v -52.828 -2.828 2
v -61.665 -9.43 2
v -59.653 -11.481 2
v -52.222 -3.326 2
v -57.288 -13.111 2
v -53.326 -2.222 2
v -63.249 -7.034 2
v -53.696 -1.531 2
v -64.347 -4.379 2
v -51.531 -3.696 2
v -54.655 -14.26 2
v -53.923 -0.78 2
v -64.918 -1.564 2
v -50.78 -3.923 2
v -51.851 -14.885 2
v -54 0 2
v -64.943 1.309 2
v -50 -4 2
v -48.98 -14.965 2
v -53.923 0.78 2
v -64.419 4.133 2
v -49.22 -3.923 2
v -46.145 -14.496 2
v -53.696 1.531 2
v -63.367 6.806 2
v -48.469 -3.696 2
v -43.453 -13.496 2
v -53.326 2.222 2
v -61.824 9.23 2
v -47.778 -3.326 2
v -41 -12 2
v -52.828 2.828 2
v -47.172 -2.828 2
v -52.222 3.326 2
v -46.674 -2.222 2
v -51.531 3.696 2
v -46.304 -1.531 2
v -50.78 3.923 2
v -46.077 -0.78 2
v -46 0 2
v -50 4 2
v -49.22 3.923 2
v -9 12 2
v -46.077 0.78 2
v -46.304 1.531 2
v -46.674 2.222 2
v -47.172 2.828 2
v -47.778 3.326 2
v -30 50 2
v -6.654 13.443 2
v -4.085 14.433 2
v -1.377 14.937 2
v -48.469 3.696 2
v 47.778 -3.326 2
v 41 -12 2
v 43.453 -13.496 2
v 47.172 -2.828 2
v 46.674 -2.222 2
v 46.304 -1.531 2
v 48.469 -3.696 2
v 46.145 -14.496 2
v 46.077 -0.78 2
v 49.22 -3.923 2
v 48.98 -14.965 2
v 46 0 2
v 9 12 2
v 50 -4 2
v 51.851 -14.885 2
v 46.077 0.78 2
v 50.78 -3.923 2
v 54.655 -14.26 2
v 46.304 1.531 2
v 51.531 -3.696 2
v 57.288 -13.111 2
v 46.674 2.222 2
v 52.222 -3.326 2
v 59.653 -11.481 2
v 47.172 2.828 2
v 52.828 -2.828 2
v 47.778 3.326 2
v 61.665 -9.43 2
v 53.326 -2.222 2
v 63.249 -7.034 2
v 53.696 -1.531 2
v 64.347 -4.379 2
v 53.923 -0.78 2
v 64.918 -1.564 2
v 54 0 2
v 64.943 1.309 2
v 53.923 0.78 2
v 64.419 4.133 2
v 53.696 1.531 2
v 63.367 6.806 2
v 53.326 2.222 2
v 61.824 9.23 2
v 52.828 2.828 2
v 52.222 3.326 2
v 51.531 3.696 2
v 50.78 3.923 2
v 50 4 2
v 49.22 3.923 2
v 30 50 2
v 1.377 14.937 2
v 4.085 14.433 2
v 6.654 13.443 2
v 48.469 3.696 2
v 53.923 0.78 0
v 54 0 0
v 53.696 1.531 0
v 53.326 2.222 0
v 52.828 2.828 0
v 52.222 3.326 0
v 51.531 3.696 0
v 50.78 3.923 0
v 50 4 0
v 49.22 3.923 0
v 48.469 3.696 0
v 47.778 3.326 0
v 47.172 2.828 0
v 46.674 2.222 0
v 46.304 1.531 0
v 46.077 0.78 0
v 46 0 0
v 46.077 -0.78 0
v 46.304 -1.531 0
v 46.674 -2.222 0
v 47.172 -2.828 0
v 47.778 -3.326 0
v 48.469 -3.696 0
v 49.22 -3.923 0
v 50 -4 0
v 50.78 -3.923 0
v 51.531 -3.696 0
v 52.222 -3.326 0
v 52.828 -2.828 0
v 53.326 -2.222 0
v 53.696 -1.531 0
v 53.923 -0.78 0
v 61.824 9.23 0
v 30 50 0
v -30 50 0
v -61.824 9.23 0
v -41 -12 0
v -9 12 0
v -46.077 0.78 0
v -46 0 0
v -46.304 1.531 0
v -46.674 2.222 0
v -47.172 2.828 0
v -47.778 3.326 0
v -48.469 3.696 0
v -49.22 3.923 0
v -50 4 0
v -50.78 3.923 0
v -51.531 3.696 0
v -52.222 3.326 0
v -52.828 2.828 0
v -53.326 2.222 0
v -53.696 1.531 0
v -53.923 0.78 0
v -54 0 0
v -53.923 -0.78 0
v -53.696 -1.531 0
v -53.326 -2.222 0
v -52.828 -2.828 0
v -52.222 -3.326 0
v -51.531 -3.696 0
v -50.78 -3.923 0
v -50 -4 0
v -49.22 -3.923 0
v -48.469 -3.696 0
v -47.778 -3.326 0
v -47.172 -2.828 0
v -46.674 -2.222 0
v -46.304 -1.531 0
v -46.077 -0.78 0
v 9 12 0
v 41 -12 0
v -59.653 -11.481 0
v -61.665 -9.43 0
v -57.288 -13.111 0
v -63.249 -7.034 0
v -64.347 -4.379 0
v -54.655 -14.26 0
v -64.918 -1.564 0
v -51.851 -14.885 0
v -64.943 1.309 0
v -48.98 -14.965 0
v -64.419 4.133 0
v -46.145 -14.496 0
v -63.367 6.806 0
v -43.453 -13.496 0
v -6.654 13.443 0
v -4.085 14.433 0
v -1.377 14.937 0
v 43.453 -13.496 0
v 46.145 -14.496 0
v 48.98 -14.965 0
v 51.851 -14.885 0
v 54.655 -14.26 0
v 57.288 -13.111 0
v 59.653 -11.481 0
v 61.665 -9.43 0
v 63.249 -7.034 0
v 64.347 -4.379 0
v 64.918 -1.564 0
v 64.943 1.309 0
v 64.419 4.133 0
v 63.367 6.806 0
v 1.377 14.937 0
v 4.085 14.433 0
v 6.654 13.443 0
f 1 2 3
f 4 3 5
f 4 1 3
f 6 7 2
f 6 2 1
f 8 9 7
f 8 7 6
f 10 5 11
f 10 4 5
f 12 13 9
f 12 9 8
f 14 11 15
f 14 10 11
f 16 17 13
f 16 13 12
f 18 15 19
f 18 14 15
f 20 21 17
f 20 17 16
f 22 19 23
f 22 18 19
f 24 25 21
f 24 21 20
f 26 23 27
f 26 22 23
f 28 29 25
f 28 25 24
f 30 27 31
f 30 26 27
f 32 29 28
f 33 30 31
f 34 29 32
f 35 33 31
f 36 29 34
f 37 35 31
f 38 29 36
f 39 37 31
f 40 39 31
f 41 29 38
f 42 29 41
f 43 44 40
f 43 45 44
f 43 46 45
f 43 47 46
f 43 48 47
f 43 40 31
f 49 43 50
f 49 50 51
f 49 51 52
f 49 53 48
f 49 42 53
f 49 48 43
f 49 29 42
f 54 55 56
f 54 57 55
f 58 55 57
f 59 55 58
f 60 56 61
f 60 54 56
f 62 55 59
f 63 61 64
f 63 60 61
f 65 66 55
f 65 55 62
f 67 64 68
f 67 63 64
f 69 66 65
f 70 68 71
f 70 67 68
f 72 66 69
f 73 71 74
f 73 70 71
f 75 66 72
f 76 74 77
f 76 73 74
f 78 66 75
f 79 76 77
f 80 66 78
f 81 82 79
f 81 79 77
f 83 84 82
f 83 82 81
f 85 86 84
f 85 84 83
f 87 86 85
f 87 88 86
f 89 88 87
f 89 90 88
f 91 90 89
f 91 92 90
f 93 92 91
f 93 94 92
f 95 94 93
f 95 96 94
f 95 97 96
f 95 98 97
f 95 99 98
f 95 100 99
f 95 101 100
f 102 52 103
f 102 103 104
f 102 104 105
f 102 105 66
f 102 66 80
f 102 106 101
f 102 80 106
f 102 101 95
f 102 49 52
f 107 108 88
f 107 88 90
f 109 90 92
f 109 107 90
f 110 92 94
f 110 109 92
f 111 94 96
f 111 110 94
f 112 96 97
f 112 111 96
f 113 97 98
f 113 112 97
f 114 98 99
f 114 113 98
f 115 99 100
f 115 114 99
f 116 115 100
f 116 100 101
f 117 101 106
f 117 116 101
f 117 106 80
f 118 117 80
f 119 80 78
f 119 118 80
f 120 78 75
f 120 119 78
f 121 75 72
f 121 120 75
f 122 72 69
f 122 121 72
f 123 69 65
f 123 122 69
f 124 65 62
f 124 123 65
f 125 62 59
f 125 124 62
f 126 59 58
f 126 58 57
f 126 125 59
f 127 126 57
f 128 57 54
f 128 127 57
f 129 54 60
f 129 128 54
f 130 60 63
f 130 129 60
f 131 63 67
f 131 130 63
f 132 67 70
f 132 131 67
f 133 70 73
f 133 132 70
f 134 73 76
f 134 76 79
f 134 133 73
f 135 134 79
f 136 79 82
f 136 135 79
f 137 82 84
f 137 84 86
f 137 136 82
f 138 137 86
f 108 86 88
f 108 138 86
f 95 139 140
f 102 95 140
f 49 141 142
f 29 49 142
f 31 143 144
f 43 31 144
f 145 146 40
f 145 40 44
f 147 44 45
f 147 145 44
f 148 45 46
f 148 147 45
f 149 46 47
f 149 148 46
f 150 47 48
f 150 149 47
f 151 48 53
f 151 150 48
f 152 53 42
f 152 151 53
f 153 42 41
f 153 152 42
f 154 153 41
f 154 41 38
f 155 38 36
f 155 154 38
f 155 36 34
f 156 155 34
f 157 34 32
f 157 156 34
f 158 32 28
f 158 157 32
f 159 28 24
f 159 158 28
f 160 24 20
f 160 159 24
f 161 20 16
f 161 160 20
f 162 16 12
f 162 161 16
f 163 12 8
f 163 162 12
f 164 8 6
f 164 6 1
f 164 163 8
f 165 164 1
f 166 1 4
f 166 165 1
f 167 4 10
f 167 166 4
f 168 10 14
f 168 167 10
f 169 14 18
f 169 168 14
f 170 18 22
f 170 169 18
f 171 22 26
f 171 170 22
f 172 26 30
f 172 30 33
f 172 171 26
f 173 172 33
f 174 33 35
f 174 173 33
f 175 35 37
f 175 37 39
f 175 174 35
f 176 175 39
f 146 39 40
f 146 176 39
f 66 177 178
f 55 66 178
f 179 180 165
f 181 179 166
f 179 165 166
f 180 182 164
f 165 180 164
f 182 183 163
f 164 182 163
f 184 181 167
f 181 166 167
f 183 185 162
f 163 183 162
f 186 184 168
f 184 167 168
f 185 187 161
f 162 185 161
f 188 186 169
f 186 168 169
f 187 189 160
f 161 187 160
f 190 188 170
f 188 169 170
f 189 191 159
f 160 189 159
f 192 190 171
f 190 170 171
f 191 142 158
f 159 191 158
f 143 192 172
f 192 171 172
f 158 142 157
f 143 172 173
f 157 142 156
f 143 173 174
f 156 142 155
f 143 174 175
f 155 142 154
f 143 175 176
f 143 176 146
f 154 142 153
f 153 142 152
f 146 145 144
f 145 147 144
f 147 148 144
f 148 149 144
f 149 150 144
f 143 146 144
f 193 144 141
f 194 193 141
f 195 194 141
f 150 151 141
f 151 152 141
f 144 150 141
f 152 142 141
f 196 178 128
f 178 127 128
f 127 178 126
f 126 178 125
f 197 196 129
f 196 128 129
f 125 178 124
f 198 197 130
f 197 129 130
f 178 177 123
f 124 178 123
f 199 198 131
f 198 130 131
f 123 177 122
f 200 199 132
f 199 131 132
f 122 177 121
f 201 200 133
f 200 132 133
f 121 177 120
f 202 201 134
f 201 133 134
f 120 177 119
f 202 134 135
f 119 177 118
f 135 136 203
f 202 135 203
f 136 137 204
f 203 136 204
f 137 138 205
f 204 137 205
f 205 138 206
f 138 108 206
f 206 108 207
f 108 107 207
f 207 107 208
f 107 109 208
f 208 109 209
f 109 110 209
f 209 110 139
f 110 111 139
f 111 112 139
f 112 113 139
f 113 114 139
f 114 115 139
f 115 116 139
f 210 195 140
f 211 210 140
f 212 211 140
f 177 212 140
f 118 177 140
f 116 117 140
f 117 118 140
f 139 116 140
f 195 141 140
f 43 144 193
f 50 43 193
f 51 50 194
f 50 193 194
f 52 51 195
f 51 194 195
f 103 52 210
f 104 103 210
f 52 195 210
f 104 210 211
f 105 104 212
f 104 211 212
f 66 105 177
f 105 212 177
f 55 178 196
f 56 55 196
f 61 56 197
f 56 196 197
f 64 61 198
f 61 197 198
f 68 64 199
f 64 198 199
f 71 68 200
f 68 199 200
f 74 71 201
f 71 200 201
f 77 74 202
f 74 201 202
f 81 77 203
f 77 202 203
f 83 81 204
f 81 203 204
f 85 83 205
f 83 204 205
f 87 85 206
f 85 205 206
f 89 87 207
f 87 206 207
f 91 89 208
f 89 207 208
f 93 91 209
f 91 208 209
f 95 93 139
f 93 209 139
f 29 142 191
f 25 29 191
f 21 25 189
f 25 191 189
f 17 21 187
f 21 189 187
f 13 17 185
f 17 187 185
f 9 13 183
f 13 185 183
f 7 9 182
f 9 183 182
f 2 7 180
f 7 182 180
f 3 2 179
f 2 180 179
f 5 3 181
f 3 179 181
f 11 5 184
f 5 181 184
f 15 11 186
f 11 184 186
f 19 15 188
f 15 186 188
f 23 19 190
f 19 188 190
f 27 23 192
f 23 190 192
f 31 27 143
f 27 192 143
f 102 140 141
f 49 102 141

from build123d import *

# Parameters (mm, degrees)
F0_R     = 4
F1_DEPTH = 2


with BuildPart() as f1:
    # F0 (on Top) → F1 (new body)
    with BuildSketch(Plane.XY):
        with BuildLine():
            Line((-30, 50), (-61.824242, 9.229697))
            ThreePointArc((-61.824242, 9.229697), (-60.708366, -10.503852), (-41, -12))
            Line((-41, -12), (-9, 12))
            ThreePointArc((-9, 12), (0, 15), (9, 12))
            Line((9, 12), (41, -12))
            ThreePointArc((41, -12), (60.708366, -10.503852), (61.824242, 9.229697))
            Line((61.824242, 9.229697), (30, 50))
            Line((30, 50), (-30, 50))
        make_face()
        with Locations((-50, 0)):
            Circle(F0_R, mode=Mode.SUBTRACT)
        with Locations((50, 0)):
            Circle(F0_R, mode=Mode.SUBTRACT)
    extrude(amount=F1_DEPTH)


solid = f1.part
